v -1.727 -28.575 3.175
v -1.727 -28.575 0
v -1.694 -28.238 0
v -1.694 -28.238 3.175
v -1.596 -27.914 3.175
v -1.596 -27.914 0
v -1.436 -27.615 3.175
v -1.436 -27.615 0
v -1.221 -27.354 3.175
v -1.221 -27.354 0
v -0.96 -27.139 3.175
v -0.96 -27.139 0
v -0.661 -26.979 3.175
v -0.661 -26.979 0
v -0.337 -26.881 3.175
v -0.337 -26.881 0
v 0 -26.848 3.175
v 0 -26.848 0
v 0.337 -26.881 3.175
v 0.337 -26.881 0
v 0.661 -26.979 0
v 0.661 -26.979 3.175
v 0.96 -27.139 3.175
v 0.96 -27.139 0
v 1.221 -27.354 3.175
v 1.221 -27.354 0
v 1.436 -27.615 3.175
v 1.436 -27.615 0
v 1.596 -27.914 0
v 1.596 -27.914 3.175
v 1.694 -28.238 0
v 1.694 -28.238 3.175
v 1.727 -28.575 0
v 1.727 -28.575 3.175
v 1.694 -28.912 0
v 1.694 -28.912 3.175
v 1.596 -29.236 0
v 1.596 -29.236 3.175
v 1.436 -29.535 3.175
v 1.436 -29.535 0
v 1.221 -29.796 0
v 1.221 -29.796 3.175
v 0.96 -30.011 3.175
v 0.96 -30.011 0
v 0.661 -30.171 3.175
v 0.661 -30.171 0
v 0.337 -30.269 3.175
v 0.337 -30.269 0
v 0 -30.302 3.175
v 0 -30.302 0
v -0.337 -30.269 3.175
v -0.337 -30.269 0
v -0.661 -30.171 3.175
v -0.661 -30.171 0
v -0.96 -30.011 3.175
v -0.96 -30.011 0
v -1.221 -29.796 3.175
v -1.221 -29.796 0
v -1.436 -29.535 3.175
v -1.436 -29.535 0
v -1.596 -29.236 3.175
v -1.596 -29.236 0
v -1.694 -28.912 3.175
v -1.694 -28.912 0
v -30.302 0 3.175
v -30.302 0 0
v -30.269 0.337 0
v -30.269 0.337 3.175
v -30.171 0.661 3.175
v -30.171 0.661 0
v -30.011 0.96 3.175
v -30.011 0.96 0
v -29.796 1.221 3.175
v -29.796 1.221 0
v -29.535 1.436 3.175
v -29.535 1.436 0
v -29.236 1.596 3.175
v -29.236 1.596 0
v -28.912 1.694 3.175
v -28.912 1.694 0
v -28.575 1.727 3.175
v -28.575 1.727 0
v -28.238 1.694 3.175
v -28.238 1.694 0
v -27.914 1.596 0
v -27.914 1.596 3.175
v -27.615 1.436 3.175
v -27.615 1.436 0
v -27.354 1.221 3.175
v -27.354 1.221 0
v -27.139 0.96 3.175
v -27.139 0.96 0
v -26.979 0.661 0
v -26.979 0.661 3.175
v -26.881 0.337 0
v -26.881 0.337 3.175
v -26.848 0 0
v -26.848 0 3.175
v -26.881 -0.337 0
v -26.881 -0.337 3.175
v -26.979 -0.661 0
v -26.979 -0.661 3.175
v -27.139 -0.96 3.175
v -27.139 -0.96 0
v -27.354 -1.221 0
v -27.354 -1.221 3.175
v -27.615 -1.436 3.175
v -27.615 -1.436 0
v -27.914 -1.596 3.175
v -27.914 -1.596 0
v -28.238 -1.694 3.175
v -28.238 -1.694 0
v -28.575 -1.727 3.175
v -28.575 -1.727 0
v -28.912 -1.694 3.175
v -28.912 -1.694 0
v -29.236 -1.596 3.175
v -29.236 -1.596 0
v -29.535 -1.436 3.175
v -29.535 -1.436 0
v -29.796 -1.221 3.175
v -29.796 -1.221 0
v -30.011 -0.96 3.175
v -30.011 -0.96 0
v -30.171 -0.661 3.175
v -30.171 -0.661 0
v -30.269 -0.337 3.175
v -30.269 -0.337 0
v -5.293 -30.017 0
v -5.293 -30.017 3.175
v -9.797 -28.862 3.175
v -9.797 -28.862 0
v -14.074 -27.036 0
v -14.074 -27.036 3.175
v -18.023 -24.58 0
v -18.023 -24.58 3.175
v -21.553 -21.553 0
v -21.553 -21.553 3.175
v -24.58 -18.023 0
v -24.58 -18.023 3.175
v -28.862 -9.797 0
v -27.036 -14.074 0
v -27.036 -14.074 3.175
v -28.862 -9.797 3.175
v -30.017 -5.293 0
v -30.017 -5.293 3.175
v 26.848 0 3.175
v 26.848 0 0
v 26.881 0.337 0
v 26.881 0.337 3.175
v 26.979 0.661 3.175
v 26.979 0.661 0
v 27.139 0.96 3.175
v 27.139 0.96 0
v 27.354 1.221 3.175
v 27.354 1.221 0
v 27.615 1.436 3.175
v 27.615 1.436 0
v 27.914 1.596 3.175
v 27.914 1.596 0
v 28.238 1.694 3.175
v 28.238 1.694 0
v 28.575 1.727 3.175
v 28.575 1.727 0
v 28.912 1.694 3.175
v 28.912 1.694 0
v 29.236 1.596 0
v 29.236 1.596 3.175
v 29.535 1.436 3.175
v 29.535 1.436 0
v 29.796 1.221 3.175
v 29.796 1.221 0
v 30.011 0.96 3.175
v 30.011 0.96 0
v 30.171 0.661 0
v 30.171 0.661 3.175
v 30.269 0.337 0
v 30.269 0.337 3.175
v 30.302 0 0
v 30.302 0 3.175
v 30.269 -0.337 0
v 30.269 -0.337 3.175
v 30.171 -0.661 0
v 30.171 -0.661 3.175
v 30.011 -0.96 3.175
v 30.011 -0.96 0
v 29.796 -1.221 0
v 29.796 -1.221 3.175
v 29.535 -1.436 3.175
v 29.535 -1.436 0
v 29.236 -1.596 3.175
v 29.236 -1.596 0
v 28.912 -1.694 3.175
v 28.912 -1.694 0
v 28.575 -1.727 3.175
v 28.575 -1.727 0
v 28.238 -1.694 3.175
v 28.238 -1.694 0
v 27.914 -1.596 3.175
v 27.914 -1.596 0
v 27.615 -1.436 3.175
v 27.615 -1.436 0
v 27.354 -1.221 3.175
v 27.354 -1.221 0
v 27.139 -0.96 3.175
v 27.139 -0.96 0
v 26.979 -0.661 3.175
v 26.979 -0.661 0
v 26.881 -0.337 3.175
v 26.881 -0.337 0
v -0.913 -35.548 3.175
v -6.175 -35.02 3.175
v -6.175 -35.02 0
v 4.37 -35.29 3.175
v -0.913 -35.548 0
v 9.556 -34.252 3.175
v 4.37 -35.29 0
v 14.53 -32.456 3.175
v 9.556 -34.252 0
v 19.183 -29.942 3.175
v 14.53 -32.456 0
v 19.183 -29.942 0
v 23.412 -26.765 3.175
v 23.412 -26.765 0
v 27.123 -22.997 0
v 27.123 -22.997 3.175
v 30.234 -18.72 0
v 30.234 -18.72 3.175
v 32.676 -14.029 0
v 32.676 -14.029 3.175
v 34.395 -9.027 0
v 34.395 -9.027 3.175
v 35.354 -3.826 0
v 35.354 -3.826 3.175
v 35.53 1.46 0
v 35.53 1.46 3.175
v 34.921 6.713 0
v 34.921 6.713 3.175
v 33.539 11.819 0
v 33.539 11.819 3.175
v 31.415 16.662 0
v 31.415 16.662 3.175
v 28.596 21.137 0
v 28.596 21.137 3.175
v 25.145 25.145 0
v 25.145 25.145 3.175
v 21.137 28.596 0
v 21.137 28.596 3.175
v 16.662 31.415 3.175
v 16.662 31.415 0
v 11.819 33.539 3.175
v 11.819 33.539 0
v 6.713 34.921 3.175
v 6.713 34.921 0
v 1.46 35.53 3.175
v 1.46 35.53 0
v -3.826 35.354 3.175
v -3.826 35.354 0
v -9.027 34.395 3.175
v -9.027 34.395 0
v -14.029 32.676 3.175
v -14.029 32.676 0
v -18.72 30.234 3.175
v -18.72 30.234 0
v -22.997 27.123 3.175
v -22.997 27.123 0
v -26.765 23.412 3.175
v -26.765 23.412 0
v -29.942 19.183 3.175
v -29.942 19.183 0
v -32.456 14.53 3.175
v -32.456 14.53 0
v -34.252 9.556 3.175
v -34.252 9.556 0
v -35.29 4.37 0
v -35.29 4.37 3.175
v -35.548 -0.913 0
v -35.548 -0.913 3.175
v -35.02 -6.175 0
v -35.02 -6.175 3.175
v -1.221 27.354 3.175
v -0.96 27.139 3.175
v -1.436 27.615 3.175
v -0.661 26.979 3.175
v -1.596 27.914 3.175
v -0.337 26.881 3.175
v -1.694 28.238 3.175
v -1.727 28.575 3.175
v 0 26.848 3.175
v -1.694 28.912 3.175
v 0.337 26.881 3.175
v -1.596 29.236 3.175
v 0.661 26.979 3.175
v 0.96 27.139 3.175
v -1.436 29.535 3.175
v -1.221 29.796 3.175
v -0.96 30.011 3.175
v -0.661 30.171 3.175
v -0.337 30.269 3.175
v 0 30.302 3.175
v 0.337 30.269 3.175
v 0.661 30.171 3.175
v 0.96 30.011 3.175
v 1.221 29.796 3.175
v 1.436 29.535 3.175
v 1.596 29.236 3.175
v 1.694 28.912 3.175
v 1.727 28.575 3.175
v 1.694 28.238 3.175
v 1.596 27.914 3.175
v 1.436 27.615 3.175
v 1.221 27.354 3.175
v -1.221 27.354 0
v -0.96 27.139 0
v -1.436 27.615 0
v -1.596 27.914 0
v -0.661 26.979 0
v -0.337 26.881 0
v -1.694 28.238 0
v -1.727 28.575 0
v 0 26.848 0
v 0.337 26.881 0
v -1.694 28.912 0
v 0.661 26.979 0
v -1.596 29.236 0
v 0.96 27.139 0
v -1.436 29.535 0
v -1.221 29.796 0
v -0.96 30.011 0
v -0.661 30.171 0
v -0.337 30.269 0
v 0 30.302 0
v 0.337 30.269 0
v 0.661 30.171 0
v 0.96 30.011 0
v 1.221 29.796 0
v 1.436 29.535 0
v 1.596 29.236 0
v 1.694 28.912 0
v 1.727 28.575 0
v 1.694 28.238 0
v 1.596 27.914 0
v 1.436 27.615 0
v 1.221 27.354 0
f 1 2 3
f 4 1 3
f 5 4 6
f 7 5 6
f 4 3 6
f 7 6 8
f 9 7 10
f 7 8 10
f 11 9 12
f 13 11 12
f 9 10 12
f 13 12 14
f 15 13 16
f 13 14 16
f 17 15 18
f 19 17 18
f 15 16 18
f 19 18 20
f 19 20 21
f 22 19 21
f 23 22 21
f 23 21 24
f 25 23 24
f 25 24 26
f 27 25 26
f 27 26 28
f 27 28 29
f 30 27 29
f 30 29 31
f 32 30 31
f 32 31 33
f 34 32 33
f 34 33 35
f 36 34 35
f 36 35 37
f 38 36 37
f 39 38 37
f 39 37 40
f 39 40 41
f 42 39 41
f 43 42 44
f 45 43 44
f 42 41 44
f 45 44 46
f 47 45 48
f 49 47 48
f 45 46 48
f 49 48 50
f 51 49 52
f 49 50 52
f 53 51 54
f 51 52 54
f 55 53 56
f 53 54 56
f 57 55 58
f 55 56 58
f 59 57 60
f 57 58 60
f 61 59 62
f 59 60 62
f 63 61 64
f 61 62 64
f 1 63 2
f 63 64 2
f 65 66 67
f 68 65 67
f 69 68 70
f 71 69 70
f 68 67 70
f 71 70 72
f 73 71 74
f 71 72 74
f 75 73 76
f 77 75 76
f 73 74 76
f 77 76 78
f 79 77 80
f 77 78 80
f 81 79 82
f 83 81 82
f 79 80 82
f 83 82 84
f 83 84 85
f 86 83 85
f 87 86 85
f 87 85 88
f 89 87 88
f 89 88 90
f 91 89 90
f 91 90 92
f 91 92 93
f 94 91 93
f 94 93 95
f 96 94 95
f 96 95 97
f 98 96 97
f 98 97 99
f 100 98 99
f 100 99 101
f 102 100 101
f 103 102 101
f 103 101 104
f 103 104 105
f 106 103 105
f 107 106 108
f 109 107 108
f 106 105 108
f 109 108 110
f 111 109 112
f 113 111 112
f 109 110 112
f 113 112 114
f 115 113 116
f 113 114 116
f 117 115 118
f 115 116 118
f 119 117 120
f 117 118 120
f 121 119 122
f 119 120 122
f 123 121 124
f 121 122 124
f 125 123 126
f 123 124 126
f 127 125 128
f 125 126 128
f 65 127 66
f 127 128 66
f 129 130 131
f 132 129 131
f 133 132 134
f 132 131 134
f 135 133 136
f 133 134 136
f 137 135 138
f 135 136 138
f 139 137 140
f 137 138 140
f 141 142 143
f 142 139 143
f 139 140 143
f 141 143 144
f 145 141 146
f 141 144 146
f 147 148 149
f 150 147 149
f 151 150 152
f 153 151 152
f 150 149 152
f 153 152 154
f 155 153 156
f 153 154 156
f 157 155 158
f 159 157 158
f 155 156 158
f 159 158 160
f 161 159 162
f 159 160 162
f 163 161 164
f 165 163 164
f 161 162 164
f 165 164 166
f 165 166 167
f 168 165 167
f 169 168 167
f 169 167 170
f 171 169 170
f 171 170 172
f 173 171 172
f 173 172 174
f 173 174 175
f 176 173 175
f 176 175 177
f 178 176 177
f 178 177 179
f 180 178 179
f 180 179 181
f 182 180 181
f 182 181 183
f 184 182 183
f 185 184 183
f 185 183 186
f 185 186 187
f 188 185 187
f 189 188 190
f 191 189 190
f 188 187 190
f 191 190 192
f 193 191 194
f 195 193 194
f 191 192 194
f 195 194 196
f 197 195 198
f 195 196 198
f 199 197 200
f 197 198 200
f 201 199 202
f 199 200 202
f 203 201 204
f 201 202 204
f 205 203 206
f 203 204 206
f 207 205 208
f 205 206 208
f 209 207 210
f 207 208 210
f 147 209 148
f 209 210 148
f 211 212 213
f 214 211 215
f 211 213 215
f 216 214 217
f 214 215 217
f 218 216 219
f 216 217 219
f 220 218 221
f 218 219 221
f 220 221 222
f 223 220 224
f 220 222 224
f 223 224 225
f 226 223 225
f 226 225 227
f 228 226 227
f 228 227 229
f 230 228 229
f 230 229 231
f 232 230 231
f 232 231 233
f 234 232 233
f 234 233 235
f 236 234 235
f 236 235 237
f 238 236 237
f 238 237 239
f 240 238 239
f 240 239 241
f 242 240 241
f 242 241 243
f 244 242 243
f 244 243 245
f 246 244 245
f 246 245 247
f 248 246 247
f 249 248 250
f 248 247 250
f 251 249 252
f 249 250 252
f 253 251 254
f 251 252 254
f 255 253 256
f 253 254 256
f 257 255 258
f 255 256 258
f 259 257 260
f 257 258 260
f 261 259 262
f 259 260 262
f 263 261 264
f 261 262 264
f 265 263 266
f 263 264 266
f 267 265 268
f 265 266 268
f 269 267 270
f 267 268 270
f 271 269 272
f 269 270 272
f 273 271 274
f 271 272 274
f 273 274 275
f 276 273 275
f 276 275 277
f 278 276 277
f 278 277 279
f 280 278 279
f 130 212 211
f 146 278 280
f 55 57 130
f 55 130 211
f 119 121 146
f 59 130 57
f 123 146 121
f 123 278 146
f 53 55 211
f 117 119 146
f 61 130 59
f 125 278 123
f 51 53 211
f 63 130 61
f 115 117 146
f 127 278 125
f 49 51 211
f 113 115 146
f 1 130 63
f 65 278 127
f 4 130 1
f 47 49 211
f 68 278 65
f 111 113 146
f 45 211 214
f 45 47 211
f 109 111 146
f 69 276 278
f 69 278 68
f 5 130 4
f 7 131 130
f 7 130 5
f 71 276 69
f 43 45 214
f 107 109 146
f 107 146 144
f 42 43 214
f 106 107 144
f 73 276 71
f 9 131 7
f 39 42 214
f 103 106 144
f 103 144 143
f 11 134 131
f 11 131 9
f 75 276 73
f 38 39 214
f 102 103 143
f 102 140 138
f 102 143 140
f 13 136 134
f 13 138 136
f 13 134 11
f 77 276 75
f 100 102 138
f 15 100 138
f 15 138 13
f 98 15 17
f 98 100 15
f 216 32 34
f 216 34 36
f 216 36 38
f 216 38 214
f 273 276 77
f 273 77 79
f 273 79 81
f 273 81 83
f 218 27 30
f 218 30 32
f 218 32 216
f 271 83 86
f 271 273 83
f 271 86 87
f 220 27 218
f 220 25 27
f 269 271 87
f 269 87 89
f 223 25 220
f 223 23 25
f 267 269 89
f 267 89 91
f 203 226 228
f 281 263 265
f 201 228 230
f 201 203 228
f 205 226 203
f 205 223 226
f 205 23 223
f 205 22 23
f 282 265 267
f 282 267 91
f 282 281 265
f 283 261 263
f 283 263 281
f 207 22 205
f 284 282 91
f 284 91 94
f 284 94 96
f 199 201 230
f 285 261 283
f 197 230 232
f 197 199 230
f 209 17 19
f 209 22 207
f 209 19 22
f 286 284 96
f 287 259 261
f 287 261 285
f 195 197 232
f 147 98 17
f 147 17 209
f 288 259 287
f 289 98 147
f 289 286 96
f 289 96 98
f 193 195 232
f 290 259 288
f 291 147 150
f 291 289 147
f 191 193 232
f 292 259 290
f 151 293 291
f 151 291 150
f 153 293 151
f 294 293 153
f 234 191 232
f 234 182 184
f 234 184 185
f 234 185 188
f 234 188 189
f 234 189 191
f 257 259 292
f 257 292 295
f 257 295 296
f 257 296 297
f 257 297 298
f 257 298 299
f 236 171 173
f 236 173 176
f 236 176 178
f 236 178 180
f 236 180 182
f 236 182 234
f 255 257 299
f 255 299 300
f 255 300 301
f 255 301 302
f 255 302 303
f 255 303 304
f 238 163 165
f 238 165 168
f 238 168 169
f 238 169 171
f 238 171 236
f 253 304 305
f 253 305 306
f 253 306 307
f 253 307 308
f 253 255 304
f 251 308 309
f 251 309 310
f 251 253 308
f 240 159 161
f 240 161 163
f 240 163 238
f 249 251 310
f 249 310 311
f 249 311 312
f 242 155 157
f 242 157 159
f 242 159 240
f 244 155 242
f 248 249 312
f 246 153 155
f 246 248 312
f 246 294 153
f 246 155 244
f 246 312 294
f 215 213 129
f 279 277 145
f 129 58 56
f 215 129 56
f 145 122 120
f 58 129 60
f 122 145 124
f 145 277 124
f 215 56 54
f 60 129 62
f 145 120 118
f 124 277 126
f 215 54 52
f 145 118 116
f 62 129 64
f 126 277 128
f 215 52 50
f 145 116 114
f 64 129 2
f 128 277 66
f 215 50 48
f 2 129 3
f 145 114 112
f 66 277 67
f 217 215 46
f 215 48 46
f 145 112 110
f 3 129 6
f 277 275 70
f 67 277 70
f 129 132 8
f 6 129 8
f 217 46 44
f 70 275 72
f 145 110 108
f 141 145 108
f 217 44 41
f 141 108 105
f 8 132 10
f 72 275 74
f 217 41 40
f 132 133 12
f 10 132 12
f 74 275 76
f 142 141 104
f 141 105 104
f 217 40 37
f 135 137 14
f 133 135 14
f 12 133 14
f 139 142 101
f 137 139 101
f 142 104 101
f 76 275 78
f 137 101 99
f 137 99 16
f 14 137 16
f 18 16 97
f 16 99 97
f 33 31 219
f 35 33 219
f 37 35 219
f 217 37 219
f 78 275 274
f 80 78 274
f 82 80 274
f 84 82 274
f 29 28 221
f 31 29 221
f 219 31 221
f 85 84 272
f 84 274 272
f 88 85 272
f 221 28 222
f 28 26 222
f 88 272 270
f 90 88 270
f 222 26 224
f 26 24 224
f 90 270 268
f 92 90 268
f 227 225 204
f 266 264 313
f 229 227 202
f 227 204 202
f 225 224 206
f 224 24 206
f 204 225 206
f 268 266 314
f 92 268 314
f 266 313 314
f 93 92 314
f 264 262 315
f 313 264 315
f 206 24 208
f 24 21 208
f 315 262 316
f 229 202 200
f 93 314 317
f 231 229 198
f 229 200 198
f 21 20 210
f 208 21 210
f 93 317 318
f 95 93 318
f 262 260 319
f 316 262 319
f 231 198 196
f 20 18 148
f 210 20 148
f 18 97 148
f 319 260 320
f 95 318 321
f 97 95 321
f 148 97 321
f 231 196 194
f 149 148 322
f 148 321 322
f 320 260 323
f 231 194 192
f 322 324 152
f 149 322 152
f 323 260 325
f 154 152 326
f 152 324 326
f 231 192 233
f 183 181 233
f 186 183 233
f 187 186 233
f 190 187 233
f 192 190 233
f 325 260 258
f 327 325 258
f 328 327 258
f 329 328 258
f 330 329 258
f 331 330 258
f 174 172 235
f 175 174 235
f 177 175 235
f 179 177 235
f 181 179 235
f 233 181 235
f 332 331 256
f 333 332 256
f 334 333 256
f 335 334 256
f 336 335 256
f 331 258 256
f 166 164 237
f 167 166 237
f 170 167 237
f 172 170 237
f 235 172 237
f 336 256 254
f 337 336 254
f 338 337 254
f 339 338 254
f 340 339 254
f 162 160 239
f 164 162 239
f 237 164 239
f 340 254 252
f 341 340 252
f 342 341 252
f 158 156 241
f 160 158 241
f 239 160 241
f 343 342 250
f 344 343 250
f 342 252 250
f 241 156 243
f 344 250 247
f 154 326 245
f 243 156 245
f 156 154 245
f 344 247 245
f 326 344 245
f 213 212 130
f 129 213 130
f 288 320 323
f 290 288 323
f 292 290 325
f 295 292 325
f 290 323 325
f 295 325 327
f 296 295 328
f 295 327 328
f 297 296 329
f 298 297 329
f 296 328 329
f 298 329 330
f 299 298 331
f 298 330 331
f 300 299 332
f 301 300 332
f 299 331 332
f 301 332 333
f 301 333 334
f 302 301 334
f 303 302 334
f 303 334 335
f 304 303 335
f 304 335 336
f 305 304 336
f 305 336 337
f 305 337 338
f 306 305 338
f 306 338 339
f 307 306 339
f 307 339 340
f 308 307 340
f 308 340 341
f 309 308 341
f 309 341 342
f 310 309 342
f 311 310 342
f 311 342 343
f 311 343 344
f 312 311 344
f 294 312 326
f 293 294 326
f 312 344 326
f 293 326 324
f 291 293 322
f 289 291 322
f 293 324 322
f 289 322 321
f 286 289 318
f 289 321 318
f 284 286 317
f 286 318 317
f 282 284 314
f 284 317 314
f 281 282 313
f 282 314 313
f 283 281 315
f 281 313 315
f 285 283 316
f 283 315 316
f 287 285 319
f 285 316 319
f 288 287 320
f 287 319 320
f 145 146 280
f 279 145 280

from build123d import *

# Parameters (mm, degrees)
F0_R     = 35.56
F1_DEPTH = 3.175
F3_D     = 3.4544
F3_DEPTH = 11.43
F3_TIP   = 1.0378064612
F5_DEPTH = 3.176


with BuildPart() as f1:
    # F0 (on Top) → F1 (new body)
    with BuildSketch(Plane.XY):
        Circle(F0_R)
    extrude(amount=F1_DEPTH)

    # F3
    with Locations(Plane.XY.offset(3.175)):
        with Locations((-28.575, 0), (0, 28.575), (28.575, 0), (0, -28.575)):
            Hole(F3_D / 2, depth=F3_DEPTH)
            with Locations((0, 0, -(F3_DEPTH + F3_TIP / 2))):  # 118° drill point
                Cone(0, F3_D / 2, F3_TIP, mode=Mode.SUBTRACT)

    # F4 (on face) → F5 (cut, through all)
    with BuildSketch(Plane.XY.offset(3.175)):
        with BuildLine():
            ThreePointArc((-5.2927964553, -30.0169403118), (-21.5526146906, -21.5526146906), (-30.0169403118, -5.2927964553))
            Line((-30.0169403118, -5.2927964553), (-35.0197636971, -6.1749291978))
            ThreePointArc((-35.0197636971, -6.1749291978), (-25.144717139, -25.144717139), (-6.1749291978, -35.0197636971))
            Line((-6.1749291978, -35.0197636971), (-5.2927964553, -30.0169403118))
        make_face()
    extrude(amount=-F5_DEPTH, mode=Mode.SUBTRACT)


solid = f1.part
